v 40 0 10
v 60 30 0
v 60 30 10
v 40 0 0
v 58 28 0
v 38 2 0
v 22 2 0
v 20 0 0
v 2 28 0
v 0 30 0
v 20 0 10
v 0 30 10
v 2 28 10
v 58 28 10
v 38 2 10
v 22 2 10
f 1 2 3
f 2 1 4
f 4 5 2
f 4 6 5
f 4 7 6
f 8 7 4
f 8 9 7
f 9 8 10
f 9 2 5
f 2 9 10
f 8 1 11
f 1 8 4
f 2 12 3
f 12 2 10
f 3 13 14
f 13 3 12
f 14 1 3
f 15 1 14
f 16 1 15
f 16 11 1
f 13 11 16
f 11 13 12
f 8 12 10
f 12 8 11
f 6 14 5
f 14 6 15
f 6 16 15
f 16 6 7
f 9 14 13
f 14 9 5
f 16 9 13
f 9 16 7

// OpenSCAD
switchSide = 14.2;
topWidth = 60;
bottomWidth = 20;
depth = 30;
wallThickness = 2;

difference() {
    //outer
    linear_extrude(height = 10)
    polygon(points=[
        [(topWidth - bottomWidth)/2,0],
        [((topWidth - bottomWidth)/2) + bottomWidth,0],
        [topWidth,depth],
        [0,depth]
    ]);
    
    //inner
    linear_extrude(height = 10)
    polygon(points=[
        [(topWidth - bottomWidth)/2 + wallThickness, 0 + wallThickness],
        [((topWidth - bottomWidth)/2) - wallThickness + bottomWidth,0 + wallThickness],
        [(topWidth) - wallThickness, depth - wallThickness],
        [0 + wallThickness,depth - wallThickness]
    ]);

    
}
